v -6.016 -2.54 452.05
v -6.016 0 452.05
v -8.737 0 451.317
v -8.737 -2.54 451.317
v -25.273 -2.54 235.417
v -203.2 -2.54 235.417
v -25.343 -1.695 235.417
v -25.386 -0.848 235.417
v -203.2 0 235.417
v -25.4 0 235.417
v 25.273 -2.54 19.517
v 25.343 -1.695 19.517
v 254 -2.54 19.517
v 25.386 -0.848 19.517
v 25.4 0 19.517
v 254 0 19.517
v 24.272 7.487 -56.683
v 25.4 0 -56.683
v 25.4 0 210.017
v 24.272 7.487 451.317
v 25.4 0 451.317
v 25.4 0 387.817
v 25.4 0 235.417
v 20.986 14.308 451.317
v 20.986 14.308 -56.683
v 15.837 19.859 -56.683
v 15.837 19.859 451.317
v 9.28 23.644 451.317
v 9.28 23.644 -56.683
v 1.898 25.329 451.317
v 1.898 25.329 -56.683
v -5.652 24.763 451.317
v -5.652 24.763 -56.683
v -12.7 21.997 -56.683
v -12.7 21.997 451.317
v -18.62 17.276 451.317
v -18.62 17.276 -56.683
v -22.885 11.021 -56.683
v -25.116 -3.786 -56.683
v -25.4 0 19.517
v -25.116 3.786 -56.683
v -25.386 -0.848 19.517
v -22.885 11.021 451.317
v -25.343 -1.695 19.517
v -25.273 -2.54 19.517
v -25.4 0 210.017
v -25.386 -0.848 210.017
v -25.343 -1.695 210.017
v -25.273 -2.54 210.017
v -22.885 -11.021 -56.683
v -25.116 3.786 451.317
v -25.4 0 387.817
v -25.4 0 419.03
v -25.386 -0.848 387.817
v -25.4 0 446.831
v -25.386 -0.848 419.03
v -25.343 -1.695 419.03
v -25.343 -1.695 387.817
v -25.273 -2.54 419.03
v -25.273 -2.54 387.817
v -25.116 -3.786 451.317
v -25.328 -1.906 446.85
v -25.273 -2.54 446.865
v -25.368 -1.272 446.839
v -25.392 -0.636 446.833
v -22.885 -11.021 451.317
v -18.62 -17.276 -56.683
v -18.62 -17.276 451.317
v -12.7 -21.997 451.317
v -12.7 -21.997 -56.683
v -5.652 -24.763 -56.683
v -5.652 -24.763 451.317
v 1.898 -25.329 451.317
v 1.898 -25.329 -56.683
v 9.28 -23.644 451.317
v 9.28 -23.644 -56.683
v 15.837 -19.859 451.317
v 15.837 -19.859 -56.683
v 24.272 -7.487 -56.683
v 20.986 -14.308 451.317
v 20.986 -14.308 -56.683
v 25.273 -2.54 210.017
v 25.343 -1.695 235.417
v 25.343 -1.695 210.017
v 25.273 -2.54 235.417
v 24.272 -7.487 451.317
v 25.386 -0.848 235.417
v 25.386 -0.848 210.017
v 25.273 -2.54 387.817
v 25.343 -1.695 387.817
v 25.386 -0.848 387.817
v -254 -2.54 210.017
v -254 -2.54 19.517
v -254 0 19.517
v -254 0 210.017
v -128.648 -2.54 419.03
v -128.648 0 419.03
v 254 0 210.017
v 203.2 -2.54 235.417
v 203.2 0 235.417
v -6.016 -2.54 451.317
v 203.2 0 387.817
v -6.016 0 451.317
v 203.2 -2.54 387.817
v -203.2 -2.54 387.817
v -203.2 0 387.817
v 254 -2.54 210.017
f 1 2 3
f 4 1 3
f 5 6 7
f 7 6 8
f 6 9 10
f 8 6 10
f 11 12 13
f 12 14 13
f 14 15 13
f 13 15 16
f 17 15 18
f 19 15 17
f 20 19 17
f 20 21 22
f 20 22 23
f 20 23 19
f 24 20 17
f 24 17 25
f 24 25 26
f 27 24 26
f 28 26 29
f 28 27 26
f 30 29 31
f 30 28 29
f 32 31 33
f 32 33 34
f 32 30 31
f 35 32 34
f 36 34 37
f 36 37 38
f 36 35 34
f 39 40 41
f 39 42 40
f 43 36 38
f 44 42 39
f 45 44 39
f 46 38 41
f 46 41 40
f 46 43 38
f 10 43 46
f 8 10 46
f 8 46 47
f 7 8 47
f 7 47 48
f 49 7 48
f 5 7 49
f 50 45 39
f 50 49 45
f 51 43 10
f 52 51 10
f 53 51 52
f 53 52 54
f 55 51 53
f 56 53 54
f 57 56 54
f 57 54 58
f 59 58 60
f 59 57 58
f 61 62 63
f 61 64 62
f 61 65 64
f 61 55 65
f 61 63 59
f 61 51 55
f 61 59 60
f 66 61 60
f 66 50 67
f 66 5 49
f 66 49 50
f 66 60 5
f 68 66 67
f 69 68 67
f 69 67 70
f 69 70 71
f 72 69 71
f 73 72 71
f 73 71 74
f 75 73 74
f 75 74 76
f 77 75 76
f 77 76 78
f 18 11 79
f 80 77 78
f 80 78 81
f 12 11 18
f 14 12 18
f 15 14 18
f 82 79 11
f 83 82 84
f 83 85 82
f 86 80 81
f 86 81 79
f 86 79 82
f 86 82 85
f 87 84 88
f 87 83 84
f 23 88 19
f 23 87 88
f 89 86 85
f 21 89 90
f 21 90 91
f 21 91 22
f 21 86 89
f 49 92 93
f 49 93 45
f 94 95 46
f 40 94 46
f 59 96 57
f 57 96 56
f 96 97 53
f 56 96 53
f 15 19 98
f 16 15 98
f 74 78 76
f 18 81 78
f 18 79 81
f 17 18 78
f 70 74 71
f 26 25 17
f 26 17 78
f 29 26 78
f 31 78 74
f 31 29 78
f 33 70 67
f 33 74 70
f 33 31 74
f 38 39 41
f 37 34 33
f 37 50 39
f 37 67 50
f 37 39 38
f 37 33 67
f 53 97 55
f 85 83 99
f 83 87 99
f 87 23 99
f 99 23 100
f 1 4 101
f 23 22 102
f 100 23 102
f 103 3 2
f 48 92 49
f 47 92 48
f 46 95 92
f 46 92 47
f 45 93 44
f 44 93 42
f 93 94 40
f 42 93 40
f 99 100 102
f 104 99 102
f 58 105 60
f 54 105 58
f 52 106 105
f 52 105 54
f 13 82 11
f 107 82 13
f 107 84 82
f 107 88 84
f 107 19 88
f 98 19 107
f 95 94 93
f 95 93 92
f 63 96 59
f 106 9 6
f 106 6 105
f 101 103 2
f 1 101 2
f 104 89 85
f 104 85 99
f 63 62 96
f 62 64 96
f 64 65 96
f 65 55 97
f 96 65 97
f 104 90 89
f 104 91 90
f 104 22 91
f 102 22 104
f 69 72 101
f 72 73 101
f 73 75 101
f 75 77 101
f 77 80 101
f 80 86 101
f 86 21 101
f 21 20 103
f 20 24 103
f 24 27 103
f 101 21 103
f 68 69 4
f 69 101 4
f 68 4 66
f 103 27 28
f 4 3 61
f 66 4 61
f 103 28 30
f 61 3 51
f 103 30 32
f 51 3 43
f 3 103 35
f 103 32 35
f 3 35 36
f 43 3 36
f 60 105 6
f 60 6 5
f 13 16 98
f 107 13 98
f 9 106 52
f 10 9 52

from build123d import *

# Parameters (mm, degrees)
F0_W     = 25.4
F0_H     = 508
F2_W     = 508
F2_H     = 190.5
F3_DEPTH = 2.54
F4_W     = 406.4
F4_H     = 152.4
F5_DEPTH = 2.54


with BuildPart() as f1:
    # F0 (on Front) → F1 (revolve)
    with BuildSketch(Plane.XZ):
        with Locations((12.7, 197.317208)):
            Rectangle(F0_W, F0_H)
    revolve(axis=Axis((0, 0, 197.317208), (0, 0, 1)))

    # F2 (on Front) → F3 (join)
    with BuildSketch(Plane.XZ):
        with Locations((0, 114.767208)):
            Rectangle(F2_W, F2_H)
    extrude(amount=F3_DEPTH)

    # F4 (on Front) → F5 (join)
    with BuildSketch(Plane.XZ):
        with Locations((0, 311.617208)):
            Rectangle(F4_W, F4_H)
        Polygon((-6.016195, 419.029802), (-6.016195, 452.049802), (-128.64849, 419.029802), align=None)
    extrude(amount=F5_DEPTH)


solid = f1.part
